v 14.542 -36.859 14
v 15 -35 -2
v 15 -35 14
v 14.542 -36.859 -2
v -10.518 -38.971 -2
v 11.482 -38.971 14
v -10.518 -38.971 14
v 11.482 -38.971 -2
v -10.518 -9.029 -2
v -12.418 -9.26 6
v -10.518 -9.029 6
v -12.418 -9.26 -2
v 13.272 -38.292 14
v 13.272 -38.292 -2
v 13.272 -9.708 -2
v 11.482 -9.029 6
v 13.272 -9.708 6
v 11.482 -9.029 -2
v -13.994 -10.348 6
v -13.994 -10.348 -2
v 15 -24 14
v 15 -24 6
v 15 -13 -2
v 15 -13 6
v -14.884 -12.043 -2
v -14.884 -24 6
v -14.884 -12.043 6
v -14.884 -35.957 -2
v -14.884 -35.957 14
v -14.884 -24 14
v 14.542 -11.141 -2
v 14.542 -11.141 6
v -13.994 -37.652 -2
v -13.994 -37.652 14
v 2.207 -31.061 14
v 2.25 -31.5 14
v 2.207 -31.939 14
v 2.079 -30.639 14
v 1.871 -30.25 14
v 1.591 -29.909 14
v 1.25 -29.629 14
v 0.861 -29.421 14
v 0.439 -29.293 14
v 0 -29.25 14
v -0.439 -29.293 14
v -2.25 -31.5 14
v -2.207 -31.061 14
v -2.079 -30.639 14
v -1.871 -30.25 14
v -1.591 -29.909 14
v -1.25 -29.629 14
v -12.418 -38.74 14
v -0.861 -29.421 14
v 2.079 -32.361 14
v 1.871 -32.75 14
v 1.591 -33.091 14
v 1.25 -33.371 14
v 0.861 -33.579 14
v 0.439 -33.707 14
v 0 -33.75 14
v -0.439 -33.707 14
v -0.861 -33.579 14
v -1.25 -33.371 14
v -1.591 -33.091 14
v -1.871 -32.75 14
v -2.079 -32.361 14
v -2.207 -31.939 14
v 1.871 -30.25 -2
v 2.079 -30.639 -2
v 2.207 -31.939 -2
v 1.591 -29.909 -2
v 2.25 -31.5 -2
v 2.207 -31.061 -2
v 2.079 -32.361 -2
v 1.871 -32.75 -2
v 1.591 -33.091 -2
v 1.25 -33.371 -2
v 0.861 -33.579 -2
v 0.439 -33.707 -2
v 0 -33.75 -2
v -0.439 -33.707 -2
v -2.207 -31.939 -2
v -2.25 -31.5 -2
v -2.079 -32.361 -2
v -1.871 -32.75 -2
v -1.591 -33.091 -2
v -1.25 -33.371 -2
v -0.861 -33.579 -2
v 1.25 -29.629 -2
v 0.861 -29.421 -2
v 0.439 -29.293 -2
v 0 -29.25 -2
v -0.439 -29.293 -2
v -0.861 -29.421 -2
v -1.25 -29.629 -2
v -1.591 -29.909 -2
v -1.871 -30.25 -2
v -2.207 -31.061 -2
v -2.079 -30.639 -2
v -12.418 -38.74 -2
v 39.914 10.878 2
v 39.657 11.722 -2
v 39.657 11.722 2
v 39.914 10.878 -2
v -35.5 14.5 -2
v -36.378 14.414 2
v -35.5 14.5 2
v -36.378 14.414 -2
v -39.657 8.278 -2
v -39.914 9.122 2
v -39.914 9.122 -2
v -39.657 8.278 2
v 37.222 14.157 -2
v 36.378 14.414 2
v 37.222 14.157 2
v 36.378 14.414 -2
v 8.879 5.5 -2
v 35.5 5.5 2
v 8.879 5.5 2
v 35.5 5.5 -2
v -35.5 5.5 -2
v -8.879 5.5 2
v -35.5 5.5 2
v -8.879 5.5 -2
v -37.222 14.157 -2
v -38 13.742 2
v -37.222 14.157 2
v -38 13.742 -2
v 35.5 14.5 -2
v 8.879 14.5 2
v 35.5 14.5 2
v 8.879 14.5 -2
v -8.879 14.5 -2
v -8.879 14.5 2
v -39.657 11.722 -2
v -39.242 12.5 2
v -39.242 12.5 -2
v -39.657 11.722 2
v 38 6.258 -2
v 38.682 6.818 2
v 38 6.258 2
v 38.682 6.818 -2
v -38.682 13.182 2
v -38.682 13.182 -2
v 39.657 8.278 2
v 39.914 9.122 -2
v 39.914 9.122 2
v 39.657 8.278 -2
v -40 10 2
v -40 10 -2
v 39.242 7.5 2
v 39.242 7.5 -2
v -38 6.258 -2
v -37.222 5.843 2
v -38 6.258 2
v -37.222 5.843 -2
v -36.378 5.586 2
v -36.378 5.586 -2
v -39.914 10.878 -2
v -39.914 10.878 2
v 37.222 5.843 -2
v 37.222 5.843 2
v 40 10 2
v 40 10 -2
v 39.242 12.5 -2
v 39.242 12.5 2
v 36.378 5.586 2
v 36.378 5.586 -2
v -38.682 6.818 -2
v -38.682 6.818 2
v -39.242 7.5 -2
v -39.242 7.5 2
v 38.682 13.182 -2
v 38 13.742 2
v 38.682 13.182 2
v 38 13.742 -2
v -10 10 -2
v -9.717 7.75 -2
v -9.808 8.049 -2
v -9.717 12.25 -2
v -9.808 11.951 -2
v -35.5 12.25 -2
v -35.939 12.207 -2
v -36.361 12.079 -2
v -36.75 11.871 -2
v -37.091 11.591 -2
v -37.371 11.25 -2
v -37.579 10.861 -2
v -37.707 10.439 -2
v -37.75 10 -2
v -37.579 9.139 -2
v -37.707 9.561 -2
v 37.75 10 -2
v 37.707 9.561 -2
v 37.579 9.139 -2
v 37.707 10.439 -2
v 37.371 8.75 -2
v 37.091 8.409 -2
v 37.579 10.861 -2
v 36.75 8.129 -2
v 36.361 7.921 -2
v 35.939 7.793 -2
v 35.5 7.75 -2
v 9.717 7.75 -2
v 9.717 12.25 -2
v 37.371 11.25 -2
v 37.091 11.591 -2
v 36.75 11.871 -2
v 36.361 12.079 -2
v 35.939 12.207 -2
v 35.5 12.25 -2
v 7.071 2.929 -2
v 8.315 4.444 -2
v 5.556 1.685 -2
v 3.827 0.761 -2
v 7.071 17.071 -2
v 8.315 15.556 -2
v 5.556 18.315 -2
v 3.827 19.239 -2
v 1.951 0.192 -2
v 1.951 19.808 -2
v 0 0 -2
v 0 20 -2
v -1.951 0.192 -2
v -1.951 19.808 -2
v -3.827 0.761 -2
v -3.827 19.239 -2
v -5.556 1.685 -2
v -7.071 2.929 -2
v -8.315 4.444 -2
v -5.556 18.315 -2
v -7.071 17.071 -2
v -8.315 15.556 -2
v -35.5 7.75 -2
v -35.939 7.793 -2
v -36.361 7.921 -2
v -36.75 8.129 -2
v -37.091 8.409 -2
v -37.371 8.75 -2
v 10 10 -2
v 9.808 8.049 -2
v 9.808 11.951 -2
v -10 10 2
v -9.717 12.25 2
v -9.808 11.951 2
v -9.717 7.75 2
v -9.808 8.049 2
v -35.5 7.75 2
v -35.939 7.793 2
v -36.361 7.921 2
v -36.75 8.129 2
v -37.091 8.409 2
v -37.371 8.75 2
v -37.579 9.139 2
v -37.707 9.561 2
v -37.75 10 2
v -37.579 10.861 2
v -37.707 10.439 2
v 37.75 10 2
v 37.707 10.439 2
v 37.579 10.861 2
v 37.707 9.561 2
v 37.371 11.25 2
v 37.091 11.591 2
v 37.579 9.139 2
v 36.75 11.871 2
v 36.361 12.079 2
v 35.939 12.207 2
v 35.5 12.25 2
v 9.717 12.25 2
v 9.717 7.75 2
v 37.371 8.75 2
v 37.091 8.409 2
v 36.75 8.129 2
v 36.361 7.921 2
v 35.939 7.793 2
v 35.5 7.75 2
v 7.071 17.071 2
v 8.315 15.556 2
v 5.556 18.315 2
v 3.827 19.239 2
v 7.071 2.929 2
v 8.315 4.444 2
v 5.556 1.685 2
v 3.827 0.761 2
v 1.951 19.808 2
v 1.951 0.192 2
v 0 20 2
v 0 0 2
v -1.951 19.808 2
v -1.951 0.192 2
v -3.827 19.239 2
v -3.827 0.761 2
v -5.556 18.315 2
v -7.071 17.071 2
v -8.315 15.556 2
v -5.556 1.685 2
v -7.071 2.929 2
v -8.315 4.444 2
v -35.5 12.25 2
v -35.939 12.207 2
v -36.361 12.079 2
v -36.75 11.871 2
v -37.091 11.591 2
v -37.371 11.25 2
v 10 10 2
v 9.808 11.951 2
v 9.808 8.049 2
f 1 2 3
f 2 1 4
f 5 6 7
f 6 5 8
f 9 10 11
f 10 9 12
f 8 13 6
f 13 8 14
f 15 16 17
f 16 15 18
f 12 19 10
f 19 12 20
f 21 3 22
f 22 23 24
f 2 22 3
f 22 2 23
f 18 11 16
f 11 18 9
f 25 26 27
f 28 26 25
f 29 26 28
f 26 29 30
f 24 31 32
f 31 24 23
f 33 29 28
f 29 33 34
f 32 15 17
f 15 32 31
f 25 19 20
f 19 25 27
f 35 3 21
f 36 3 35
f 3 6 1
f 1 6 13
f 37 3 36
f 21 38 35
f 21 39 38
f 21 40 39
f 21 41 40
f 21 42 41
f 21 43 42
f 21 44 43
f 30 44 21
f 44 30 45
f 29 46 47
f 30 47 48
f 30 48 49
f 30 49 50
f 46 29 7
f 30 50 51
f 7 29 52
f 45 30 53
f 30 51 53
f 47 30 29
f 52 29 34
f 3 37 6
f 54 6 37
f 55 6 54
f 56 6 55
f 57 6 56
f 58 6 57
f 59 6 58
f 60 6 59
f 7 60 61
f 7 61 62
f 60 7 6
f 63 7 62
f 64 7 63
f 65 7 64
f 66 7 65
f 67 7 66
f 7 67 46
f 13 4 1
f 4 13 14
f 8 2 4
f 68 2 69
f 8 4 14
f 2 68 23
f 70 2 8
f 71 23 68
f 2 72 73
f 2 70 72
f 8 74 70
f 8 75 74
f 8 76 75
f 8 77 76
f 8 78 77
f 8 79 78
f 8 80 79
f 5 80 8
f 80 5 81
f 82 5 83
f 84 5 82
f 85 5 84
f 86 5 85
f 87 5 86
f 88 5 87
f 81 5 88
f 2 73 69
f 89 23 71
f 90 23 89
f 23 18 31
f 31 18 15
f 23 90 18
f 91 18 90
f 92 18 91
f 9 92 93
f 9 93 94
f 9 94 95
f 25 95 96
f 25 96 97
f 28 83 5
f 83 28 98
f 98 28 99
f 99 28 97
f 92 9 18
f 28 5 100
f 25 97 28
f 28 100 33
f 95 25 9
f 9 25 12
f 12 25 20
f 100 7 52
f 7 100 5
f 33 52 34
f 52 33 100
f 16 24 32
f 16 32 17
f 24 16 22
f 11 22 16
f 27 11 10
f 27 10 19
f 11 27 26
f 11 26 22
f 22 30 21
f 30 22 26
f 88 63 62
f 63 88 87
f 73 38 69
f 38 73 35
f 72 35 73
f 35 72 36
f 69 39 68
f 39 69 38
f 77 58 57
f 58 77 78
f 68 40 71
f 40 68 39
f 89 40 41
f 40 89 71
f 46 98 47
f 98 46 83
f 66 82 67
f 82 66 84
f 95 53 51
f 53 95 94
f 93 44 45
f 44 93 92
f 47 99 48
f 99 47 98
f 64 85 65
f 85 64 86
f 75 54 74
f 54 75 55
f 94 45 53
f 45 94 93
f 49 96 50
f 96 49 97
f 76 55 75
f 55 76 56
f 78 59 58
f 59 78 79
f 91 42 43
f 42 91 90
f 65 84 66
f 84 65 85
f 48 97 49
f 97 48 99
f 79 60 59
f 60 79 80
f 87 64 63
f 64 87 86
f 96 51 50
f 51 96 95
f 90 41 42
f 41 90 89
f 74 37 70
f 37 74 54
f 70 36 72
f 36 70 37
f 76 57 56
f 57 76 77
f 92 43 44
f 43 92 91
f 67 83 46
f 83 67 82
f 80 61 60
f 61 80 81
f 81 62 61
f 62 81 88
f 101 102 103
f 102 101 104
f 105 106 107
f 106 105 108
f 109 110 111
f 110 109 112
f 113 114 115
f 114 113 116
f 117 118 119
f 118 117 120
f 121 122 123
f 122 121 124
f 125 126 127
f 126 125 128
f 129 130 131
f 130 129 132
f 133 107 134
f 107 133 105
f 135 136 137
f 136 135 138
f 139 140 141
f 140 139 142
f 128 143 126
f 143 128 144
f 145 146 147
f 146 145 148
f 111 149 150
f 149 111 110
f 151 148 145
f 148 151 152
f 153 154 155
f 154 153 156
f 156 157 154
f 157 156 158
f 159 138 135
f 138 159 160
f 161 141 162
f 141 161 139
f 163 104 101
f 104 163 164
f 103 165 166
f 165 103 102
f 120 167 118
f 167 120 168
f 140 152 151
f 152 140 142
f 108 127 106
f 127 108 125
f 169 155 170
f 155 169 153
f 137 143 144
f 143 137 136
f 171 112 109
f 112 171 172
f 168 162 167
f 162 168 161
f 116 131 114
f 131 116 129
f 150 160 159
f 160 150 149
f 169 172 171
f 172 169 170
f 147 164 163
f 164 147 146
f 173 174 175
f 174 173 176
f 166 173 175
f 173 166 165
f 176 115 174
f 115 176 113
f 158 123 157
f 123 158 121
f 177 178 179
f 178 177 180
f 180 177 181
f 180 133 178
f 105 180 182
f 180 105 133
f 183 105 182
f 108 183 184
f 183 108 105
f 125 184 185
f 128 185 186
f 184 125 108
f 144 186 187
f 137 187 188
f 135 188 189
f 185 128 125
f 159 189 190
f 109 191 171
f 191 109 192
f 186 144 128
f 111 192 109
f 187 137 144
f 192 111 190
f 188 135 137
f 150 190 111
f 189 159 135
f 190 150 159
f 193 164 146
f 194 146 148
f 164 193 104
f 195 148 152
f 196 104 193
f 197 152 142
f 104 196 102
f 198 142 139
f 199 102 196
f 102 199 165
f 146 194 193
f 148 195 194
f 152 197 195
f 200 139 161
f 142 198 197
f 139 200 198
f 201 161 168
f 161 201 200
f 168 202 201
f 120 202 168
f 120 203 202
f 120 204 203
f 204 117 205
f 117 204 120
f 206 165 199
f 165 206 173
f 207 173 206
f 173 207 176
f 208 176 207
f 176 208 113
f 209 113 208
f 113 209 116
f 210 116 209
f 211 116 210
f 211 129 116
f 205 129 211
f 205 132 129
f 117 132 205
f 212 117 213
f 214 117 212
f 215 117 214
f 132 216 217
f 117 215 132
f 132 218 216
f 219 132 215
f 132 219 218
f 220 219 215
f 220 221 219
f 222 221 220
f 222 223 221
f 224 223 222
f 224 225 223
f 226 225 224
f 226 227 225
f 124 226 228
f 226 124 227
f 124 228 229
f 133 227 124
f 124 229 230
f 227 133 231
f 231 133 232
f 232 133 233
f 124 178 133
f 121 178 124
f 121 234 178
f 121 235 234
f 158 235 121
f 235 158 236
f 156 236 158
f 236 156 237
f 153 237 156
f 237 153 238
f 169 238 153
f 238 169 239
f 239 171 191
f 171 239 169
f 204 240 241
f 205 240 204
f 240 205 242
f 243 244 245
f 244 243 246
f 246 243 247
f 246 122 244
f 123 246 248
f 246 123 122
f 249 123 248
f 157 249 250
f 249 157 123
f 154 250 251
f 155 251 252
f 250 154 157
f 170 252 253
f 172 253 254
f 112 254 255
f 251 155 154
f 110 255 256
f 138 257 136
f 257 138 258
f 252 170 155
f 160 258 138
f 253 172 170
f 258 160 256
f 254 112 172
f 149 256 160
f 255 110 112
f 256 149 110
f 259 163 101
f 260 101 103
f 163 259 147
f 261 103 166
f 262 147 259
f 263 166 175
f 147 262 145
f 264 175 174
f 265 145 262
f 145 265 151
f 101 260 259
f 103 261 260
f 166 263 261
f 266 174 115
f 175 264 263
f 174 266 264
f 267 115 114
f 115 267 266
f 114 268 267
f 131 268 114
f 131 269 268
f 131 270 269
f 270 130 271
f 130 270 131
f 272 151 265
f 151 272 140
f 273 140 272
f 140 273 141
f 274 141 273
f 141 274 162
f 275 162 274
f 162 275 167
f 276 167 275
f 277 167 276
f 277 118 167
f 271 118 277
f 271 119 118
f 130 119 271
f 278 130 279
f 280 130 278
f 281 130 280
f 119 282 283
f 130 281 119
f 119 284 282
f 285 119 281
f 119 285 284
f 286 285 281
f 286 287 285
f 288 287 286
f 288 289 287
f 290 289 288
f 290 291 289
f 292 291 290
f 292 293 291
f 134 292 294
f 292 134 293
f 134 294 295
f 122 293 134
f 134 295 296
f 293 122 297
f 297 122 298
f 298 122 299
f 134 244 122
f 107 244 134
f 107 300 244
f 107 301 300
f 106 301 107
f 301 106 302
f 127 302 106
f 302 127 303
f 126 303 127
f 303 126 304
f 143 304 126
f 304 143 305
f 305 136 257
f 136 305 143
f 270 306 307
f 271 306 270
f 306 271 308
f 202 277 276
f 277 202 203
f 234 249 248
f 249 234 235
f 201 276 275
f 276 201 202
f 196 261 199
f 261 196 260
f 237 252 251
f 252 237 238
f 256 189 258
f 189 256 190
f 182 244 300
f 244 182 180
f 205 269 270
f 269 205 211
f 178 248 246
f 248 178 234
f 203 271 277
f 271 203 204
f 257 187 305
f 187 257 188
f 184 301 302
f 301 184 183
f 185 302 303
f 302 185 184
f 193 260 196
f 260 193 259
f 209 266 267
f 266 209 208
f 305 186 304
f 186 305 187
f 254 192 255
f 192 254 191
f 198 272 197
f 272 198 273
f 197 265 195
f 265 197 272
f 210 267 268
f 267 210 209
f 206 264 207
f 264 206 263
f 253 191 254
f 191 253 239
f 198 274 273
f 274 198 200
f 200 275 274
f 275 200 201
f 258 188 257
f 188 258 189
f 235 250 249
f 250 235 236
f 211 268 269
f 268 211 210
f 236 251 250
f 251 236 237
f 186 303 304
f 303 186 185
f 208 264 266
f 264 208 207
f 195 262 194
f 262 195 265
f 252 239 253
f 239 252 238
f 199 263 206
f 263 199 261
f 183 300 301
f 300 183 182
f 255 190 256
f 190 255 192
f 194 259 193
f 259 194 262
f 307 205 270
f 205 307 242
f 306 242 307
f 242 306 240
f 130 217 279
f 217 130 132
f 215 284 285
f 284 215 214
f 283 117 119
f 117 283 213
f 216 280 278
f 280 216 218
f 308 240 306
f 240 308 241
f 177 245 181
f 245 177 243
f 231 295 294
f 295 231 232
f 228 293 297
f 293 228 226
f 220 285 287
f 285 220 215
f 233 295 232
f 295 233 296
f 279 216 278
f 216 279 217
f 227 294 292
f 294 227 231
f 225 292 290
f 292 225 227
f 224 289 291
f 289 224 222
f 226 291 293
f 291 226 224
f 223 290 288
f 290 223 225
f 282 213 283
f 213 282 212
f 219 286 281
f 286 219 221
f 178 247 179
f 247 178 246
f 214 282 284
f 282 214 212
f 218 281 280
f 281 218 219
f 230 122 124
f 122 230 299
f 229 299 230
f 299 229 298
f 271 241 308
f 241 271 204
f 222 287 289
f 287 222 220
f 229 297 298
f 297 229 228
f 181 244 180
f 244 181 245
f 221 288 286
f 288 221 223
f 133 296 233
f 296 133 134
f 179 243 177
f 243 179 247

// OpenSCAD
len_phone = 145;
d_screw_m4 = 4.5;
width_phone = 56;
thickness_holder = 4;
thickness_phone = 8;
append = 15;
corner_round = 8;
w_grip = 30;


//holder_set();
//vertical_block(len_phone);

test_print_holder();

module test_print_holder() {
    translate([0, -24, 6])
    grip();
    horizontal_block(len_block=width_phone, offset_vertical=10);
}


module grip() {
    difference() {
        grip_base();
        
        color("red")
        translate([0, w_grip/2, thickness_phone])
        cube([w_grip+1, w_grip, 2*thickness_phone], center=true);
        
        translate([0, -w_grip/4, 0])
        cylinder(d=d_screw_m4, h=3*thickness_phone, center=true, $fn=32);
    }
}


module grip_base() {
    hull() {
        translate([w_grip/2-corner_round/2, -w_grip/2+corner_round/2, 0])
        cylinder(d=corner_round, h=2*thickness_phone, center=true);
        
        translate([-w_grip/2+corner_round/2, -w_grip/2+corner_round/2, 0])
        cylinder(d=corner_round, h=2*thickness_phone, center=true);
        
        translate([w_grip/2-corner_round/2, w_grip/2-corner_round/2, 0])
        cylinder(d=corner_round, h=2*thickness_phone, center=true);
        
        translate([-w_grip/2+corner_round/2, w_grip/2-corner_round/2, 0])
        cylinder(d=corner_round, h=2*thickness_phone, center=true);
    }
}


module holder_set() {
    horizontal_block(len_block=width_phone, offset_vertical=10);
    vertical_block(len_block=len_phone);
    
    translate([0, -len_phone/2, thickness_phone+thickness_holder/2+1])
    rotate([0, 180, 0])
    grip();
    
    translate([0, len_phone/2, thickness_phone+thickness_holder/2])
    rotate([0, 180, 180])
    grip();
    
    translate([width_phone/2, 10, thickness_phone+thickness_holder/2])
    rotate([0, 180, 90])
    grip();
    
    translate([-width_phone/2, 10, thickness_phone+thickness_holder/2])
    rotate([0, 180, -90])
    grip();
}


module vertical_block(len_block) {
    len_block = len_block + append;
    difference() {
        hull() {
            translate([0, -len_block/2, 0])
            cylinder(d=9, h=thickness_holder, center=true, $fn=32);
            
            translate([0, len_block/2, 0])
            cylinder(d=9, h=thickness_holder, center=true, $fn=32);
        }
        color("red")
        hull() {
            translate([0, -len_block/2, 0])
            cylinder(d=d_screw_m4, h=thickness_holder+2, center=true, $fn=32);
            
            translate([0, len_block/2, 0])
            cylinder(d=d_screw_m4, h=thickness_holder+2, center=true, $fn=32);
        }
    }
}


module horizontal_block(len_block, offset_vertical) {
    len_block = len_block + append;
    
    translate([0, offset_vertical, 0])
    cylinder(d=20, h=thickness_holder, center=true, $fn=32);
    
    difference() {
        hull() {
            translate([len_block/2, offset_vertical, 0])
            cylinder(d=9, h=thickness_holder, center=true, $fn=32);
            
            translate([-len_block/2, offset_vertical, 0])
            cylinder(d=9, h=thickness_holder, center=true, $fn=32);
        }
        color("red")
        hull() {
            translate([len_block/2, offset_vertical, 0])
            cylinder(d=d_screw_m4, h=thickness_holder+2, center=true, $fn=32);
            
            translate([-len_block/2, offset_vertical, 0])
            cylinder(d=d_screw_m4, h=thickness_holder+2, center=true, $fn=32);
        }
    }
}
